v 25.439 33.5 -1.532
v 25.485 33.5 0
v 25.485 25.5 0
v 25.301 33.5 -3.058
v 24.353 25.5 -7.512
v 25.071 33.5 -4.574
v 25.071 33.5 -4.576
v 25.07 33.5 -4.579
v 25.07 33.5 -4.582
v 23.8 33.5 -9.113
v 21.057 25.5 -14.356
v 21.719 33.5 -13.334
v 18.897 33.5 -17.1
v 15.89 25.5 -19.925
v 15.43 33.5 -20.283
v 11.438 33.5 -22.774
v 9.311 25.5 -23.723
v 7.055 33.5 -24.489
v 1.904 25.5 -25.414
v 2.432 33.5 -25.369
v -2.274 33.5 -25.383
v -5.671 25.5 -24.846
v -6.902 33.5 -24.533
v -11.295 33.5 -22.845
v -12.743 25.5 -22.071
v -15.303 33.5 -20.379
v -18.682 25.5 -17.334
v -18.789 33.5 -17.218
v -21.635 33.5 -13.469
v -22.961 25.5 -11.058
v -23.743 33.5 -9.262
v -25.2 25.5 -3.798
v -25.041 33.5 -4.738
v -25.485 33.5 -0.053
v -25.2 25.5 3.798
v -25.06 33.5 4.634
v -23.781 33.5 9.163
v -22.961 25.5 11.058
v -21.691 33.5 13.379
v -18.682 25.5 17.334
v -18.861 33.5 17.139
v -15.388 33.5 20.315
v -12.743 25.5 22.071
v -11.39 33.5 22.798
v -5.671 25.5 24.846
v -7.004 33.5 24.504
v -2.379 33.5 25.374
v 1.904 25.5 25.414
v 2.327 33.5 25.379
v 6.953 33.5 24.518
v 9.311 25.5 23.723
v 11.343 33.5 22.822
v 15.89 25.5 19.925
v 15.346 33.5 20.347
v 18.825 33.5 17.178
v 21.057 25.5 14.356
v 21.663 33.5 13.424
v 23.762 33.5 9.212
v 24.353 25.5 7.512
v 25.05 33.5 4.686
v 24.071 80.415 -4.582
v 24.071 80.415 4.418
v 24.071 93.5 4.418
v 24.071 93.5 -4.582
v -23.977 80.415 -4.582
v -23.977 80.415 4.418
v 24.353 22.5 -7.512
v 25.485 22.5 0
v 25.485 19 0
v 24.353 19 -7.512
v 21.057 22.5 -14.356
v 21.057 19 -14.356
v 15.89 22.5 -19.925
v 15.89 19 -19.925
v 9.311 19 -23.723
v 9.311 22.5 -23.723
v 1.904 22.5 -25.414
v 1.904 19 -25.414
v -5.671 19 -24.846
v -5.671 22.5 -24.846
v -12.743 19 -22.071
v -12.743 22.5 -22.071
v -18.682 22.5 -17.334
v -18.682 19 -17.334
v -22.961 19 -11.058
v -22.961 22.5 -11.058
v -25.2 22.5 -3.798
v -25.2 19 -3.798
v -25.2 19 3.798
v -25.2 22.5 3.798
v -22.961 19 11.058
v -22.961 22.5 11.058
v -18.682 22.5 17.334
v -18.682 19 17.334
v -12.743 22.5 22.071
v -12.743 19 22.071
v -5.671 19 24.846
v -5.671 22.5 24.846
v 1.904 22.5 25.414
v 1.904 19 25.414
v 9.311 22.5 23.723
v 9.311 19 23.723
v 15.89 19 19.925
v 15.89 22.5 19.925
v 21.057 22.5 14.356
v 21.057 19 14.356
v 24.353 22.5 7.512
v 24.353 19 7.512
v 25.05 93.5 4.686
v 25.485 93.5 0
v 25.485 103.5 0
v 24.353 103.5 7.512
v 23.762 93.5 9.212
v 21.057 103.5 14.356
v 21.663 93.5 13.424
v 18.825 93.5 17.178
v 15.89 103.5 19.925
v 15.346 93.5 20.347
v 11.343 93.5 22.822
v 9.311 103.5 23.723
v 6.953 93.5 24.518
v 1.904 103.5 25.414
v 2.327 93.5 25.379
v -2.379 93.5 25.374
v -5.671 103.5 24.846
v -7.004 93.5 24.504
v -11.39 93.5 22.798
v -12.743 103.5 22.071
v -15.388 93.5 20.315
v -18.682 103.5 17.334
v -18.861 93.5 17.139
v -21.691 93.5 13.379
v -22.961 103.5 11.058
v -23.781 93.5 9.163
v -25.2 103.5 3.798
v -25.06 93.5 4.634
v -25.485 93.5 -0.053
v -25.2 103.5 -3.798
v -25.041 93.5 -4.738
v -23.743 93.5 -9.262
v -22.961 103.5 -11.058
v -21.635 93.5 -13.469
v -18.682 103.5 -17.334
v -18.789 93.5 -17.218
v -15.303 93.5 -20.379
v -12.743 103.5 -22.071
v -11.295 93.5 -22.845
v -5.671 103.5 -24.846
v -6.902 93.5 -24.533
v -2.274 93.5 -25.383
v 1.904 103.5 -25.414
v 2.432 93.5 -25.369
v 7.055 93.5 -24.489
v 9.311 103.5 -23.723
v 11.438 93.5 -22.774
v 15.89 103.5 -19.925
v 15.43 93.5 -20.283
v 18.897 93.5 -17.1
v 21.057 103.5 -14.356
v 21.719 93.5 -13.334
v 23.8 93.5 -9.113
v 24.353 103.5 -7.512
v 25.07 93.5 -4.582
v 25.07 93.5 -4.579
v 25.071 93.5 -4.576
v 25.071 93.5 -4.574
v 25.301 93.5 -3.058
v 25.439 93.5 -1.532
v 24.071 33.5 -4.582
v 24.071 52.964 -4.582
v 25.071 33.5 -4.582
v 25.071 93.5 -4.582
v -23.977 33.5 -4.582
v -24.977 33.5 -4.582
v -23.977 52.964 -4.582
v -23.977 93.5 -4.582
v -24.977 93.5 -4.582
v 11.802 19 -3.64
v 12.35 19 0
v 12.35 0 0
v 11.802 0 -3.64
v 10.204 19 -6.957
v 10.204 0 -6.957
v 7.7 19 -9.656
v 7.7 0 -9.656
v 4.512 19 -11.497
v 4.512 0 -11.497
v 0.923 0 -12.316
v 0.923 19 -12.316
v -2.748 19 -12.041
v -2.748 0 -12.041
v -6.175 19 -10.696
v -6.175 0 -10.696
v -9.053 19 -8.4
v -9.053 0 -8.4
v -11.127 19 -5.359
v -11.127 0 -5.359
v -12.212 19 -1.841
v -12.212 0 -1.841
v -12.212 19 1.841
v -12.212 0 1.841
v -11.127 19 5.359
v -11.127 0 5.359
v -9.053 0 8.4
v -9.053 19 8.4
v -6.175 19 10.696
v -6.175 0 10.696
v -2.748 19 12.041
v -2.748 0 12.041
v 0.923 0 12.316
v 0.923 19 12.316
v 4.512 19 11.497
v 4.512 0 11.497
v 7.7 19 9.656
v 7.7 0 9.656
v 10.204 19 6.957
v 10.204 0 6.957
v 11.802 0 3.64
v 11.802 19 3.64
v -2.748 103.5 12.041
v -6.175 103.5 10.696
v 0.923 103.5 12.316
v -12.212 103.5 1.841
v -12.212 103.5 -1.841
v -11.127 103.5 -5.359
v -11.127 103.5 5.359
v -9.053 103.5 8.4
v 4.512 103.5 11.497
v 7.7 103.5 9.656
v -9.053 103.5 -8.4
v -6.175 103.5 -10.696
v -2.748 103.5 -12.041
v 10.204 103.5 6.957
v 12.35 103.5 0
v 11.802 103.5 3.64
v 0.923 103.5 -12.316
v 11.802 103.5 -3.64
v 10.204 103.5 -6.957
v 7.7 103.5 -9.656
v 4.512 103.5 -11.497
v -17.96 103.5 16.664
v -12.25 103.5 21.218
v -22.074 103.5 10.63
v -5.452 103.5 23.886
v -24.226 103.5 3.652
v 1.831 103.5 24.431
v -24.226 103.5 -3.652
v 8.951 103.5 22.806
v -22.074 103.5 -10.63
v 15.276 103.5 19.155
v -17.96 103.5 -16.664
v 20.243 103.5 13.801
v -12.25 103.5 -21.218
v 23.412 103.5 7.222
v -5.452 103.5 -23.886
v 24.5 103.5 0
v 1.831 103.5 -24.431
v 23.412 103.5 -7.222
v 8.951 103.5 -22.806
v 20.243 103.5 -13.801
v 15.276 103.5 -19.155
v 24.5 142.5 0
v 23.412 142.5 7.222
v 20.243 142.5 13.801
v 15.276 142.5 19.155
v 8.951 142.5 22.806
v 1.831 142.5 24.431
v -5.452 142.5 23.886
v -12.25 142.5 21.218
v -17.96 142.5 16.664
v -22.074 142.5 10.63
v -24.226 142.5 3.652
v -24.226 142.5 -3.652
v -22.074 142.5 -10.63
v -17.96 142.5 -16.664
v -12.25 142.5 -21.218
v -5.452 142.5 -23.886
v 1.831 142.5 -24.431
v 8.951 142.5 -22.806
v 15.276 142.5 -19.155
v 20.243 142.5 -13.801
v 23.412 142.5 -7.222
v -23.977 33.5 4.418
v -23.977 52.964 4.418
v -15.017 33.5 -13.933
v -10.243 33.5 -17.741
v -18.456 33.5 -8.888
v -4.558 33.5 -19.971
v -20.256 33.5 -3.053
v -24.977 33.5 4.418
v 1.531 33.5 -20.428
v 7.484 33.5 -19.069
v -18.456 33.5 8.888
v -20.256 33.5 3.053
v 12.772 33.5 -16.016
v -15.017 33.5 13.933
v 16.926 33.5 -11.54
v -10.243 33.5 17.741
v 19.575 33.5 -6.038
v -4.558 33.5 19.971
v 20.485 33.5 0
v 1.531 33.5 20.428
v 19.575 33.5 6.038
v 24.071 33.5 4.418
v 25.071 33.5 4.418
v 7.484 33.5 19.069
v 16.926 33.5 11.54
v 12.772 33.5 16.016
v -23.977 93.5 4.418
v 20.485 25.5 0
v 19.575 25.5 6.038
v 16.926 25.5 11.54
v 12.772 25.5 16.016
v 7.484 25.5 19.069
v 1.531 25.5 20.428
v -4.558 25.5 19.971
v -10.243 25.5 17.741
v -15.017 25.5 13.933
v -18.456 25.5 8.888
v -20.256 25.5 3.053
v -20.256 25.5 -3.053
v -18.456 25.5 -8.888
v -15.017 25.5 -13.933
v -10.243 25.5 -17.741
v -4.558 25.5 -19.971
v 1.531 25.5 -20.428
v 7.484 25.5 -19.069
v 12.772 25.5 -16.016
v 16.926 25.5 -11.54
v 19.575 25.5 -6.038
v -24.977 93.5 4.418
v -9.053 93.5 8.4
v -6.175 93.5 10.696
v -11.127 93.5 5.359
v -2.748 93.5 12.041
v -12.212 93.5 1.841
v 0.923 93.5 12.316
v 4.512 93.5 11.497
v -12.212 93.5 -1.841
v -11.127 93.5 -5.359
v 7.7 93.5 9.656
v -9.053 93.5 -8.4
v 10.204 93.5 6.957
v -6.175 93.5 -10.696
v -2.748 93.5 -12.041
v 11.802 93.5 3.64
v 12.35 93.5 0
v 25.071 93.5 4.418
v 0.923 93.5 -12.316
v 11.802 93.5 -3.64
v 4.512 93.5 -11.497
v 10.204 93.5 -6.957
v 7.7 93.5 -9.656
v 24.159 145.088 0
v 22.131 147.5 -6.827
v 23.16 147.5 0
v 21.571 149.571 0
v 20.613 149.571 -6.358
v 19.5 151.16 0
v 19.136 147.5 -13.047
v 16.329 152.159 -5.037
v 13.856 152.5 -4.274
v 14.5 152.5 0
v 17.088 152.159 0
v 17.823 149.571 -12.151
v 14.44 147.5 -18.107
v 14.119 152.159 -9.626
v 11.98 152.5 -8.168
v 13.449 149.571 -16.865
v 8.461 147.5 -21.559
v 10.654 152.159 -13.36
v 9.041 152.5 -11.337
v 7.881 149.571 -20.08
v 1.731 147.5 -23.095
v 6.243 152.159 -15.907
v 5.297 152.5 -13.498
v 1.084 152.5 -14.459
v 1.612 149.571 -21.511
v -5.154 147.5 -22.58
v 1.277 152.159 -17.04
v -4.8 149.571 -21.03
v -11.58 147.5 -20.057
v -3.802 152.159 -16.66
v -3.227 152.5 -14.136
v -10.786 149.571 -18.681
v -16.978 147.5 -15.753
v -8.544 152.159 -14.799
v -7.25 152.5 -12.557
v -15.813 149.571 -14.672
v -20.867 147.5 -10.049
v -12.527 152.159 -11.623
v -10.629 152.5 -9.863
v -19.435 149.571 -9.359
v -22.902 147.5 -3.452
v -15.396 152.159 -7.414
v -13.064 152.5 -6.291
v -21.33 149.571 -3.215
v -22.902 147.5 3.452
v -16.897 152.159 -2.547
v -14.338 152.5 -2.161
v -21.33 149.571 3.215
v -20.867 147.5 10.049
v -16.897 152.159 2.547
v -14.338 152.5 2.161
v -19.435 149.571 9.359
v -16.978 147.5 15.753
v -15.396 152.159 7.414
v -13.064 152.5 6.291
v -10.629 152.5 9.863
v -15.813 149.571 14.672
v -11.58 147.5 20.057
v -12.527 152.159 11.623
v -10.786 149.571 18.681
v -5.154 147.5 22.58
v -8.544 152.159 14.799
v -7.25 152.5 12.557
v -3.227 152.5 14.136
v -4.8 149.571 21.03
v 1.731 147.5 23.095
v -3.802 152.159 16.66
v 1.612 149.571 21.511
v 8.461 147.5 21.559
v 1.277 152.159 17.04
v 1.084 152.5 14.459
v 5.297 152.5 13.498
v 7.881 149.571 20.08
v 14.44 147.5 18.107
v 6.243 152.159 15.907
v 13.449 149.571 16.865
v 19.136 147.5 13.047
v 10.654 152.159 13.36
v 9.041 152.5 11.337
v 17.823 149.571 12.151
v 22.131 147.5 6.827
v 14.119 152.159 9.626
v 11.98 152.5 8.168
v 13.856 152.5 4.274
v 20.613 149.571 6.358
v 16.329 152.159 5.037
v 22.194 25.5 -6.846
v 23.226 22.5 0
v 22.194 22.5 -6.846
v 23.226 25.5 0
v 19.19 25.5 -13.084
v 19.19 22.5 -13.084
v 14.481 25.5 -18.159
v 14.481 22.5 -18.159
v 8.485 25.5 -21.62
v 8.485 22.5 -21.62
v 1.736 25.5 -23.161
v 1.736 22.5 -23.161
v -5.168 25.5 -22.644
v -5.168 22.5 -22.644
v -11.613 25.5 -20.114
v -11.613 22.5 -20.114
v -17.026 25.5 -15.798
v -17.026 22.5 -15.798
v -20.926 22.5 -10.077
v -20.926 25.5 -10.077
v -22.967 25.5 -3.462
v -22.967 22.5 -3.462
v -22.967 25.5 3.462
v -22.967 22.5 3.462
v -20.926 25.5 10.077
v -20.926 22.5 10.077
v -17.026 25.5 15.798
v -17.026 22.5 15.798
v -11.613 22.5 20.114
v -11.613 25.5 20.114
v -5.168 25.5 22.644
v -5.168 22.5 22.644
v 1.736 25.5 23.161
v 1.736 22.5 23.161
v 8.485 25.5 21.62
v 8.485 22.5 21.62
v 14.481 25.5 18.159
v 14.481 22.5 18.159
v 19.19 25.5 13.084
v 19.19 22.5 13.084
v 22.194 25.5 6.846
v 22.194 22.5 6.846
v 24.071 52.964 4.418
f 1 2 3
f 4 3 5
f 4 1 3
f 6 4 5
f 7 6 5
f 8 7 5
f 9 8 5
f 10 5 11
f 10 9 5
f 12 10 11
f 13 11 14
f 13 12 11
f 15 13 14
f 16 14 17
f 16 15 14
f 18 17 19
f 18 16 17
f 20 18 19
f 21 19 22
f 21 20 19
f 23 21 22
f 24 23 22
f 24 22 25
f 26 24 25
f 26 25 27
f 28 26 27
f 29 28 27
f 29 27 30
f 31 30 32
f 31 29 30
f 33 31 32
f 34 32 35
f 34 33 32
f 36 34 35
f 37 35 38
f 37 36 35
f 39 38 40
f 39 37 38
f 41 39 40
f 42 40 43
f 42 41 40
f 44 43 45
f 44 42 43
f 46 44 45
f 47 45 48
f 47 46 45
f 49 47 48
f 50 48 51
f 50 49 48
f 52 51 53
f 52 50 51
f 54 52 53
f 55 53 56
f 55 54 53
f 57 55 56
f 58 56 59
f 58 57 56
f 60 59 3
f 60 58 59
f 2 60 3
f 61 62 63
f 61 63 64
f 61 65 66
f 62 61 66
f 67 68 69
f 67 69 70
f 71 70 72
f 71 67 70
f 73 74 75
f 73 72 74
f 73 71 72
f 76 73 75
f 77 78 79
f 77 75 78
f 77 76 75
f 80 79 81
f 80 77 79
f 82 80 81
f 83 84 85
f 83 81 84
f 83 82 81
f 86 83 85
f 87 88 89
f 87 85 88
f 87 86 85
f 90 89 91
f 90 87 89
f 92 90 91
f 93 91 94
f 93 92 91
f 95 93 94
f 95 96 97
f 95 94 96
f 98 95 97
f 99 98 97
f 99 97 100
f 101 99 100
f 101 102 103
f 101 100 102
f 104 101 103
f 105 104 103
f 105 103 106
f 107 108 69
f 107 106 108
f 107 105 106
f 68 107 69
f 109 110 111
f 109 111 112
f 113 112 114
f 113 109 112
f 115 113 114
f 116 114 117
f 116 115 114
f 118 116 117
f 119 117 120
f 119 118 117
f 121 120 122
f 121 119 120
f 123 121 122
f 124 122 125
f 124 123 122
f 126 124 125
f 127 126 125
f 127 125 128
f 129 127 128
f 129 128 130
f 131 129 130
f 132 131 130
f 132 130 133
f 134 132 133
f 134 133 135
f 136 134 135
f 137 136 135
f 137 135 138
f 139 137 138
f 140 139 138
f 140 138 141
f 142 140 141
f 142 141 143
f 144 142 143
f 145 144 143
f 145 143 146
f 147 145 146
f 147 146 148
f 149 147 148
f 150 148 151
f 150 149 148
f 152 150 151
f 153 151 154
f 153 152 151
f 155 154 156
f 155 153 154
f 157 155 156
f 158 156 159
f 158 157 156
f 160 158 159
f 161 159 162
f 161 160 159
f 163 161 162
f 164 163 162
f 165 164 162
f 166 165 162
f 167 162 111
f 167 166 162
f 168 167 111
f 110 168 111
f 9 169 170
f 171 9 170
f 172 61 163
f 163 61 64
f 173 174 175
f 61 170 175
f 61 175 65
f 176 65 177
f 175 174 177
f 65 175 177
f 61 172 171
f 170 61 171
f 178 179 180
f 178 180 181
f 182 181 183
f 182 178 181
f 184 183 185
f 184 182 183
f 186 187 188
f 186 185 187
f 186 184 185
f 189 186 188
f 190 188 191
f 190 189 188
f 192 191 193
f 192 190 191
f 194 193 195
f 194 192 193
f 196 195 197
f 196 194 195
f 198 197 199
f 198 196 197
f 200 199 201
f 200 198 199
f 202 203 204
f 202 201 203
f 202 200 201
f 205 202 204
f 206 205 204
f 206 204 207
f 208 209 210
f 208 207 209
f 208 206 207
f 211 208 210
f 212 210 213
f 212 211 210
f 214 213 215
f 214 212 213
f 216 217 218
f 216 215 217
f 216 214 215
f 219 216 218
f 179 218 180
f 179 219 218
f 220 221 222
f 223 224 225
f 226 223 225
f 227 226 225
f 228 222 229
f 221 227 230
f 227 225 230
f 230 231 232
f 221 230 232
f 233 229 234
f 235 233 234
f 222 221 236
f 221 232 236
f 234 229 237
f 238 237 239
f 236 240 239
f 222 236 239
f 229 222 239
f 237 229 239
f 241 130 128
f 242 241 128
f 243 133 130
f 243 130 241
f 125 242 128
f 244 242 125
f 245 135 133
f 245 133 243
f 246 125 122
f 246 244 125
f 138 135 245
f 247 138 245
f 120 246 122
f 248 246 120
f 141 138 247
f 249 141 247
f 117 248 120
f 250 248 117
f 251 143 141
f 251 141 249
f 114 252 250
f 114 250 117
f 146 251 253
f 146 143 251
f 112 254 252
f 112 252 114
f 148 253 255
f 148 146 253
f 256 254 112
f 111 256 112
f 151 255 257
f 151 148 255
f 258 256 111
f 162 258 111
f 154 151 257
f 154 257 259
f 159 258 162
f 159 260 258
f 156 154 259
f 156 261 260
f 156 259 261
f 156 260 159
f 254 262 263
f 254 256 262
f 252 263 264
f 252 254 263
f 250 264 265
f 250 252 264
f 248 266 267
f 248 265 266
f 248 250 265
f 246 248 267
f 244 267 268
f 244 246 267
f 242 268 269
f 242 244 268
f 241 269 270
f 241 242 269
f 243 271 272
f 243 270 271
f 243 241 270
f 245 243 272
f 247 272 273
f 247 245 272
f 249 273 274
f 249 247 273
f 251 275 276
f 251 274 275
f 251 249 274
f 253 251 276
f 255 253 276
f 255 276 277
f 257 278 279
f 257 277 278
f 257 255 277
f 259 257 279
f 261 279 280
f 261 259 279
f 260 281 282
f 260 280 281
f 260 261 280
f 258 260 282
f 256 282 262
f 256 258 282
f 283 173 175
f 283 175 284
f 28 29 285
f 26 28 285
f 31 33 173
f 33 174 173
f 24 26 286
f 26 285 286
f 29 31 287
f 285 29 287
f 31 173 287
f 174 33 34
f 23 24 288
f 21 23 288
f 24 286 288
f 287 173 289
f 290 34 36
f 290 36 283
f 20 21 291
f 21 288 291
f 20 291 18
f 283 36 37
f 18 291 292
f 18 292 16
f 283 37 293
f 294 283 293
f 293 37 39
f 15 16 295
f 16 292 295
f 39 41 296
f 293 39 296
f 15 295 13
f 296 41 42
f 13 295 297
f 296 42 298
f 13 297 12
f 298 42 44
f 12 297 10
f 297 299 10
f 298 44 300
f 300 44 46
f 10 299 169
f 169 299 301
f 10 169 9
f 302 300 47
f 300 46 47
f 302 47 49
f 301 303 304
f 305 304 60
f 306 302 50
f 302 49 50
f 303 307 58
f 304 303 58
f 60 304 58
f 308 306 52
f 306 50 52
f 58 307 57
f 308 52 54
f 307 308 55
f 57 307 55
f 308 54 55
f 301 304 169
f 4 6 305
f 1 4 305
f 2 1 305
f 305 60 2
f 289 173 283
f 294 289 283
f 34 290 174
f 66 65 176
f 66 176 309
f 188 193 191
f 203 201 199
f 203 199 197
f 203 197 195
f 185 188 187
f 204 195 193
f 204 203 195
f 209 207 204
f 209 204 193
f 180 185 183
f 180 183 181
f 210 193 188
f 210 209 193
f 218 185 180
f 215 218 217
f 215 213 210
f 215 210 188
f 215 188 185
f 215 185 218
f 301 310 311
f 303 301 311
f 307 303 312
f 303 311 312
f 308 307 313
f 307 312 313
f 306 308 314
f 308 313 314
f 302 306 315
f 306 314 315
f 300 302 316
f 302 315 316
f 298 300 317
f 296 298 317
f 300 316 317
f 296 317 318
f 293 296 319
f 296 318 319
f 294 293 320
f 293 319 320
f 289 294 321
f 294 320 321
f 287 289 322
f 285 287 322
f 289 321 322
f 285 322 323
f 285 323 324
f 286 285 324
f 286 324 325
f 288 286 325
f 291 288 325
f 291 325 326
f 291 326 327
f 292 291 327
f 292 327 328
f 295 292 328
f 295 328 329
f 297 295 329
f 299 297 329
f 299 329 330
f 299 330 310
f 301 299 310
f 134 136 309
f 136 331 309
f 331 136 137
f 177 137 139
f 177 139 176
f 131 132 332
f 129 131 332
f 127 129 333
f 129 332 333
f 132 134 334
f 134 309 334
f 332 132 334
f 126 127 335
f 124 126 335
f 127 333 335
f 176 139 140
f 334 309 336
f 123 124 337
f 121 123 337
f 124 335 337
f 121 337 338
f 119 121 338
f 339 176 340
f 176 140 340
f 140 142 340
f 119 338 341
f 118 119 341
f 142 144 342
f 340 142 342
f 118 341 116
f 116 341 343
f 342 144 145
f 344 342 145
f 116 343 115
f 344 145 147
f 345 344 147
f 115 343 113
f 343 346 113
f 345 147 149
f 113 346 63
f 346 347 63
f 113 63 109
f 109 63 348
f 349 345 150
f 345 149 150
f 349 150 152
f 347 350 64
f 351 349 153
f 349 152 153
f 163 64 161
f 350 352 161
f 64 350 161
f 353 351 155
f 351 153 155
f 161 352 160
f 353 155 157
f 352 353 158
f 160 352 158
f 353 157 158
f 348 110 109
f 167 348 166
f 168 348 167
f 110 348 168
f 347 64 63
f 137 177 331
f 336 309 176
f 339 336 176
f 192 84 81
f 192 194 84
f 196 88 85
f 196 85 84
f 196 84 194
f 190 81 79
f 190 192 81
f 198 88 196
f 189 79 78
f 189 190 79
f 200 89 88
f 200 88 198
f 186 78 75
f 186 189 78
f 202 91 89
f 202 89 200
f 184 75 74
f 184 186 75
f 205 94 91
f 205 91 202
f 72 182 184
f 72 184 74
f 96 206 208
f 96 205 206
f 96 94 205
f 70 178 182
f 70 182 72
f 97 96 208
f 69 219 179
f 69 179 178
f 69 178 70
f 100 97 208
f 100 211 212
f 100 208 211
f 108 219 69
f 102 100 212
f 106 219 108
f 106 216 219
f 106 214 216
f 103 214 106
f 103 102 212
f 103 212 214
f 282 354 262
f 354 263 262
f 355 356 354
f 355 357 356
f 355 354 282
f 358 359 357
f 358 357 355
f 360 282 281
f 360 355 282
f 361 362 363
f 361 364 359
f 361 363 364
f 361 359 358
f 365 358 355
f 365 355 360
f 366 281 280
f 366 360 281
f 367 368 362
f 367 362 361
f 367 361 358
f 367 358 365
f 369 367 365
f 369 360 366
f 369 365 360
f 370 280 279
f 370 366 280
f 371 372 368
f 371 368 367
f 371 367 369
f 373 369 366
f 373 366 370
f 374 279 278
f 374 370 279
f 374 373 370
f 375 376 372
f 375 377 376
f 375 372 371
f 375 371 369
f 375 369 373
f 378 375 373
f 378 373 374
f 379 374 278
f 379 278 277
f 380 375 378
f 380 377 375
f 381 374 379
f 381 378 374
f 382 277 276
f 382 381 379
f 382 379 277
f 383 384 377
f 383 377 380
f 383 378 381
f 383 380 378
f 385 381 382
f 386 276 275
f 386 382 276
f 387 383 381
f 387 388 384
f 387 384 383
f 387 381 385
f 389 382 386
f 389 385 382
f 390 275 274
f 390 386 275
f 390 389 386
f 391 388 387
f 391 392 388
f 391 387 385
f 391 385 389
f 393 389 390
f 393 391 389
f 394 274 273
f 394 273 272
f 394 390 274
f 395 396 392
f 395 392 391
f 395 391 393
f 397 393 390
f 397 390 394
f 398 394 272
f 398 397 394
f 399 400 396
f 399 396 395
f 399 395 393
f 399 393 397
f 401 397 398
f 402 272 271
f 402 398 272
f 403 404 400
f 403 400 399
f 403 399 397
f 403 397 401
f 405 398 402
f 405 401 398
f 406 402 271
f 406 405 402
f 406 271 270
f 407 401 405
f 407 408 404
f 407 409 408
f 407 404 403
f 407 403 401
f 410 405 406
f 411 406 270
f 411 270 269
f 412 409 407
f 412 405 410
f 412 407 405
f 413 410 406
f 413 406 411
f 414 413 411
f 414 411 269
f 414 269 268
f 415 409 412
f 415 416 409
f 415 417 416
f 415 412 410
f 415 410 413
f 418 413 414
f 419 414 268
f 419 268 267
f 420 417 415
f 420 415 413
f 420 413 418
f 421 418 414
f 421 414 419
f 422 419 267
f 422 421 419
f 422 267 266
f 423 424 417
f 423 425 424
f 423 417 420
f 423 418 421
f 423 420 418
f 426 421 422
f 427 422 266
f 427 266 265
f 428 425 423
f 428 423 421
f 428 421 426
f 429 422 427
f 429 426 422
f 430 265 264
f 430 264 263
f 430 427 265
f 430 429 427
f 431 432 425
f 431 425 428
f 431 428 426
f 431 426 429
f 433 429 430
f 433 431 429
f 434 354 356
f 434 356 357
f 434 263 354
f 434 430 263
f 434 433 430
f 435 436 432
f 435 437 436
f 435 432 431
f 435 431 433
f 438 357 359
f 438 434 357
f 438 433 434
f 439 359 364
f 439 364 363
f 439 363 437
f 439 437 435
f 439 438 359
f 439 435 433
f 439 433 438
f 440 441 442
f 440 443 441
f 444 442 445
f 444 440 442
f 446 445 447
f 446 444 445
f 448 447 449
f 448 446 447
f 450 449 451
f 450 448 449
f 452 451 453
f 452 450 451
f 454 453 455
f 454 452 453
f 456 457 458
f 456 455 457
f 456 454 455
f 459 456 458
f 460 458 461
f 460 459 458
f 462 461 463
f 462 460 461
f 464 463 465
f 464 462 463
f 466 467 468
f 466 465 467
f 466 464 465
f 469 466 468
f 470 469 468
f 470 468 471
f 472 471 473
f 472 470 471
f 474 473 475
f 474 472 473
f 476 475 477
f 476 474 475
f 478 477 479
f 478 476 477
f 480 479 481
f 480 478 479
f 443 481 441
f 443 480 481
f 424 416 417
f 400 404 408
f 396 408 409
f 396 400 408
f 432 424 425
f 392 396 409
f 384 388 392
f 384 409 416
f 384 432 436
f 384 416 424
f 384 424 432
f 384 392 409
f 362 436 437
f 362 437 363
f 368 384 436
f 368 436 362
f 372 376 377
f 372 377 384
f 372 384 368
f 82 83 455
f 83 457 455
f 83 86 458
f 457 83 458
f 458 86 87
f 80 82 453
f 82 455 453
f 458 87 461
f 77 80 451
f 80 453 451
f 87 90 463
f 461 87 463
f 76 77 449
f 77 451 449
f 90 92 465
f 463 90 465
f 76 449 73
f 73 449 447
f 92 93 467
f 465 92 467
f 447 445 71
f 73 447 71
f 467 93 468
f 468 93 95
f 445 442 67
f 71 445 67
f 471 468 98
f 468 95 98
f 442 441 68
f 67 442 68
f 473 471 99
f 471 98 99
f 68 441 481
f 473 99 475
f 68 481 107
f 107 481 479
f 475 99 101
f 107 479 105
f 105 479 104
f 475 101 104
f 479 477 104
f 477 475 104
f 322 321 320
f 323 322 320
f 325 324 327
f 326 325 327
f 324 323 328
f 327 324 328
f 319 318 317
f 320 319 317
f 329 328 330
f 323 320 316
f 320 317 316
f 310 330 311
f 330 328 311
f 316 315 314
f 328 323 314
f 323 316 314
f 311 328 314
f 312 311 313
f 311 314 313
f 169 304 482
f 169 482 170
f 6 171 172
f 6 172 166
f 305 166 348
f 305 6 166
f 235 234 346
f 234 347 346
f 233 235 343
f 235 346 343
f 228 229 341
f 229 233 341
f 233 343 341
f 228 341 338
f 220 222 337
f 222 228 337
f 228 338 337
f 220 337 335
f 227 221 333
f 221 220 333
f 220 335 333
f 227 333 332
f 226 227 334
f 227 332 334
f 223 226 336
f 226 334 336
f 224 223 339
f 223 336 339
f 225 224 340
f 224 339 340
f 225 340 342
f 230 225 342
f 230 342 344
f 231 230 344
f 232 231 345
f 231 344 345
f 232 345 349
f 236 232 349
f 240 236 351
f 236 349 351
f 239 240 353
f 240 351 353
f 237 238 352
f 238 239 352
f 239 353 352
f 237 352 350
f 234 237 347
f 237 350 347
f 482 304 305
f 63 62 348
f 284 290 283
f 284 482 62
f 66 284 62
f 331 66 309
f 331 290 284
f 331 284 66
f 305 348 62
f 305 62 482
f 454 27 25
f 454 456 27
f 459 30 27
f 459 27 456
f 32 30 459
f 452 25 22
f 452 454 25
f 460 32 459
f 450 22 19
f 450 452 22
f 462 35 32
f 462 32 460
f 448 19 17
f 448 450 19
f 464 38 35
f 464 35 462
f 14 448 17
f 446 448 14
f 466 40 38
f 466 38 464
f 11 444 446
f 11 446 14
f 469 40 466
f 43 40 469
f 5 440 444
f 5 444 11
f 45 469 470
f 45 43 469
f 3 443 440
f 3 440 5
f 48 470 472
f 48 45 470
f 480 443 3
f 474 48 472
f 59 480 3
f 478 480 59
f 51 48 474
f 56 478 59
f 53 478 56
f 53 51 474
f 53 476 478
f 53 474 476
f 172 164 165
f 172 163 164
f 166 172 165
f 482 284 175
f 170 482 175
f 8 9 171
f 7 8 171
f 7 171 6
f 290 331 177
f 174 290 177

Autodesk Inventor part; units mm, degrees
ref_plane "YZ Plane" through (0, 0, 0) normal (1, 0, 0) x (0, 1, 0)
ref_plane "XZ Plane" through (0, 0, 0) normal (0, 1, 0) x (-1, 0, 0)
ref_plane "XY Plane" through (0, 0, 0) normal (0, 0, 1) x (1, 0, 0)
sketch "Sketch1" plane through (0, 0, 0) normal (0, 0, 1) x (1, 0, 0)
  line L0 (0, 0) -> (12.3503, 0)
  line L1 (12.3503, 0) -> (12.3503, 19)
  line L2 (12.3503, 19) -> (0, 19)
  line L3 (0, 19) -> (0, 0)
  line L4 (0, 19) -> (25.485, 19)
  line L5 (25.485, 19) -> (25.485, 22.5)
  line L6 (25.485, 22.5) -> (0, 22.5)
  line L7 (0, 22.5) -> (0, 19)
  line L8 (23.226, 22.5) -> (23.226, 25.5)
  line L9 (23.226, 25.5) -> (0, 25.5)
  line L10 (0, 25.5) -> (0, 22.5)
  line L11 (23.226, 25.5) -> (25.485, 25.5)
  line L12 (25.485, 25.5) -> (25.485, 33.5)
  line L13 (25.485, 33.5) -> (20.485, 33.5)
  line L14 (20.485, 33.5) -> (20.485, 22.5)
  dimension "d0" = 19
  dimension "d1" = 25.485
  dimension "d2" = 3.5
  dimension "d3" = 90
  dimension "d4" = 3
  dimension "d5" = 8
  dimension "d6" = 5
revolve "Revolution1" add sketch "Sketch1" angle 360 about axis through (0, 19, 0) along (0, -1, 0)
sketch "Sketch2" plane through (0, 33.5, 0) normal (0, 1, 0) x (1, 0, 0)
  line L0 (25.0712, -4.4185) -> (24.0712, -4.4185)
  line L1 (24.0712, -4.4185) -> (24.0712, 4.5815)
  line L2 (24.0712, 4.5815) -> (25.0712, 4.5815)
  line L3 (25.0712, 4.5815) -> (25.0712, -4.4185)
  line L4 (-23.9768, -4.4185) -> (-24.9768, -4.4185)
  line L5 (-24.9768, -4.4185) -> (-24.9768, 4.5815)
  line L6 (-24.9768, 4.5815) -> (-23.9768, 4.5815)
  line L7 (-23.9768, 4.5815) -> (-23.9768, -4.4185)
  point P0 (0, 0)
  dimension "d8" = 1
  dimension "d9" = 9
  dimension "d10" = 1
  dimension "d11" = 9
extrude "Extrusion1" add sketch "Sketch2" along normal blind 60
sketch "Sketch3" plane through (0, 93.5, 0) normal (0, 1, 0) x (1, 0, 0)
  circle A0 centre (0, 0) radius 12.3503 projected
  circle A1 centre (0, 0) radius 25.485
extrude "Extrusion2" add sketch "Sketch3" along normal blind 10
sketch "Sketch4" plane through (0, 103.5, 0) normal (0, 1, 0) x (1, 0, 0)
  point P0 (0, 0)
sketch "Sketch5" plane through (0, 103.5, 0) normal (0, 1, 0) x (1, 0, 0)
  circle A0 centre (0, 0) radius 24.5
  dimension "d16" = 49
extrude "Extrusion3" add sketch "Sketch5" along normal blind 49
fillet "Fillet1" radius 10 1 edges at (-24.5, 152.5, 0)
sketch "Sketch6" plane through (-23.9768, 33.5, 4.4185) normal (1, 0, 0) x (0, 0, -1)
  line L0 (0, 0) -> (0, 60) projected
  line L1 (9, 0) -> (9, 60) projected
  line L2 (0, 19.4645) -> (9, 19.4645)
  line L3 (9, 19.4645) -> (9, 46.9149)
  line L4 (9, 46.9149) -> (0, 46.9149)
  line L5 (0, 46.9149) -> (0, 19.4645)
  point P0 (4.4185, -33.5)
extrude "Extrusion4" add sketch "Sketch6" along normal blind 49
thread "Thread1" size "M52x5" class "6g" standard "ANSI Metric M Profile" full length
properties part number "Part 3 of Focusrite Microphone"
